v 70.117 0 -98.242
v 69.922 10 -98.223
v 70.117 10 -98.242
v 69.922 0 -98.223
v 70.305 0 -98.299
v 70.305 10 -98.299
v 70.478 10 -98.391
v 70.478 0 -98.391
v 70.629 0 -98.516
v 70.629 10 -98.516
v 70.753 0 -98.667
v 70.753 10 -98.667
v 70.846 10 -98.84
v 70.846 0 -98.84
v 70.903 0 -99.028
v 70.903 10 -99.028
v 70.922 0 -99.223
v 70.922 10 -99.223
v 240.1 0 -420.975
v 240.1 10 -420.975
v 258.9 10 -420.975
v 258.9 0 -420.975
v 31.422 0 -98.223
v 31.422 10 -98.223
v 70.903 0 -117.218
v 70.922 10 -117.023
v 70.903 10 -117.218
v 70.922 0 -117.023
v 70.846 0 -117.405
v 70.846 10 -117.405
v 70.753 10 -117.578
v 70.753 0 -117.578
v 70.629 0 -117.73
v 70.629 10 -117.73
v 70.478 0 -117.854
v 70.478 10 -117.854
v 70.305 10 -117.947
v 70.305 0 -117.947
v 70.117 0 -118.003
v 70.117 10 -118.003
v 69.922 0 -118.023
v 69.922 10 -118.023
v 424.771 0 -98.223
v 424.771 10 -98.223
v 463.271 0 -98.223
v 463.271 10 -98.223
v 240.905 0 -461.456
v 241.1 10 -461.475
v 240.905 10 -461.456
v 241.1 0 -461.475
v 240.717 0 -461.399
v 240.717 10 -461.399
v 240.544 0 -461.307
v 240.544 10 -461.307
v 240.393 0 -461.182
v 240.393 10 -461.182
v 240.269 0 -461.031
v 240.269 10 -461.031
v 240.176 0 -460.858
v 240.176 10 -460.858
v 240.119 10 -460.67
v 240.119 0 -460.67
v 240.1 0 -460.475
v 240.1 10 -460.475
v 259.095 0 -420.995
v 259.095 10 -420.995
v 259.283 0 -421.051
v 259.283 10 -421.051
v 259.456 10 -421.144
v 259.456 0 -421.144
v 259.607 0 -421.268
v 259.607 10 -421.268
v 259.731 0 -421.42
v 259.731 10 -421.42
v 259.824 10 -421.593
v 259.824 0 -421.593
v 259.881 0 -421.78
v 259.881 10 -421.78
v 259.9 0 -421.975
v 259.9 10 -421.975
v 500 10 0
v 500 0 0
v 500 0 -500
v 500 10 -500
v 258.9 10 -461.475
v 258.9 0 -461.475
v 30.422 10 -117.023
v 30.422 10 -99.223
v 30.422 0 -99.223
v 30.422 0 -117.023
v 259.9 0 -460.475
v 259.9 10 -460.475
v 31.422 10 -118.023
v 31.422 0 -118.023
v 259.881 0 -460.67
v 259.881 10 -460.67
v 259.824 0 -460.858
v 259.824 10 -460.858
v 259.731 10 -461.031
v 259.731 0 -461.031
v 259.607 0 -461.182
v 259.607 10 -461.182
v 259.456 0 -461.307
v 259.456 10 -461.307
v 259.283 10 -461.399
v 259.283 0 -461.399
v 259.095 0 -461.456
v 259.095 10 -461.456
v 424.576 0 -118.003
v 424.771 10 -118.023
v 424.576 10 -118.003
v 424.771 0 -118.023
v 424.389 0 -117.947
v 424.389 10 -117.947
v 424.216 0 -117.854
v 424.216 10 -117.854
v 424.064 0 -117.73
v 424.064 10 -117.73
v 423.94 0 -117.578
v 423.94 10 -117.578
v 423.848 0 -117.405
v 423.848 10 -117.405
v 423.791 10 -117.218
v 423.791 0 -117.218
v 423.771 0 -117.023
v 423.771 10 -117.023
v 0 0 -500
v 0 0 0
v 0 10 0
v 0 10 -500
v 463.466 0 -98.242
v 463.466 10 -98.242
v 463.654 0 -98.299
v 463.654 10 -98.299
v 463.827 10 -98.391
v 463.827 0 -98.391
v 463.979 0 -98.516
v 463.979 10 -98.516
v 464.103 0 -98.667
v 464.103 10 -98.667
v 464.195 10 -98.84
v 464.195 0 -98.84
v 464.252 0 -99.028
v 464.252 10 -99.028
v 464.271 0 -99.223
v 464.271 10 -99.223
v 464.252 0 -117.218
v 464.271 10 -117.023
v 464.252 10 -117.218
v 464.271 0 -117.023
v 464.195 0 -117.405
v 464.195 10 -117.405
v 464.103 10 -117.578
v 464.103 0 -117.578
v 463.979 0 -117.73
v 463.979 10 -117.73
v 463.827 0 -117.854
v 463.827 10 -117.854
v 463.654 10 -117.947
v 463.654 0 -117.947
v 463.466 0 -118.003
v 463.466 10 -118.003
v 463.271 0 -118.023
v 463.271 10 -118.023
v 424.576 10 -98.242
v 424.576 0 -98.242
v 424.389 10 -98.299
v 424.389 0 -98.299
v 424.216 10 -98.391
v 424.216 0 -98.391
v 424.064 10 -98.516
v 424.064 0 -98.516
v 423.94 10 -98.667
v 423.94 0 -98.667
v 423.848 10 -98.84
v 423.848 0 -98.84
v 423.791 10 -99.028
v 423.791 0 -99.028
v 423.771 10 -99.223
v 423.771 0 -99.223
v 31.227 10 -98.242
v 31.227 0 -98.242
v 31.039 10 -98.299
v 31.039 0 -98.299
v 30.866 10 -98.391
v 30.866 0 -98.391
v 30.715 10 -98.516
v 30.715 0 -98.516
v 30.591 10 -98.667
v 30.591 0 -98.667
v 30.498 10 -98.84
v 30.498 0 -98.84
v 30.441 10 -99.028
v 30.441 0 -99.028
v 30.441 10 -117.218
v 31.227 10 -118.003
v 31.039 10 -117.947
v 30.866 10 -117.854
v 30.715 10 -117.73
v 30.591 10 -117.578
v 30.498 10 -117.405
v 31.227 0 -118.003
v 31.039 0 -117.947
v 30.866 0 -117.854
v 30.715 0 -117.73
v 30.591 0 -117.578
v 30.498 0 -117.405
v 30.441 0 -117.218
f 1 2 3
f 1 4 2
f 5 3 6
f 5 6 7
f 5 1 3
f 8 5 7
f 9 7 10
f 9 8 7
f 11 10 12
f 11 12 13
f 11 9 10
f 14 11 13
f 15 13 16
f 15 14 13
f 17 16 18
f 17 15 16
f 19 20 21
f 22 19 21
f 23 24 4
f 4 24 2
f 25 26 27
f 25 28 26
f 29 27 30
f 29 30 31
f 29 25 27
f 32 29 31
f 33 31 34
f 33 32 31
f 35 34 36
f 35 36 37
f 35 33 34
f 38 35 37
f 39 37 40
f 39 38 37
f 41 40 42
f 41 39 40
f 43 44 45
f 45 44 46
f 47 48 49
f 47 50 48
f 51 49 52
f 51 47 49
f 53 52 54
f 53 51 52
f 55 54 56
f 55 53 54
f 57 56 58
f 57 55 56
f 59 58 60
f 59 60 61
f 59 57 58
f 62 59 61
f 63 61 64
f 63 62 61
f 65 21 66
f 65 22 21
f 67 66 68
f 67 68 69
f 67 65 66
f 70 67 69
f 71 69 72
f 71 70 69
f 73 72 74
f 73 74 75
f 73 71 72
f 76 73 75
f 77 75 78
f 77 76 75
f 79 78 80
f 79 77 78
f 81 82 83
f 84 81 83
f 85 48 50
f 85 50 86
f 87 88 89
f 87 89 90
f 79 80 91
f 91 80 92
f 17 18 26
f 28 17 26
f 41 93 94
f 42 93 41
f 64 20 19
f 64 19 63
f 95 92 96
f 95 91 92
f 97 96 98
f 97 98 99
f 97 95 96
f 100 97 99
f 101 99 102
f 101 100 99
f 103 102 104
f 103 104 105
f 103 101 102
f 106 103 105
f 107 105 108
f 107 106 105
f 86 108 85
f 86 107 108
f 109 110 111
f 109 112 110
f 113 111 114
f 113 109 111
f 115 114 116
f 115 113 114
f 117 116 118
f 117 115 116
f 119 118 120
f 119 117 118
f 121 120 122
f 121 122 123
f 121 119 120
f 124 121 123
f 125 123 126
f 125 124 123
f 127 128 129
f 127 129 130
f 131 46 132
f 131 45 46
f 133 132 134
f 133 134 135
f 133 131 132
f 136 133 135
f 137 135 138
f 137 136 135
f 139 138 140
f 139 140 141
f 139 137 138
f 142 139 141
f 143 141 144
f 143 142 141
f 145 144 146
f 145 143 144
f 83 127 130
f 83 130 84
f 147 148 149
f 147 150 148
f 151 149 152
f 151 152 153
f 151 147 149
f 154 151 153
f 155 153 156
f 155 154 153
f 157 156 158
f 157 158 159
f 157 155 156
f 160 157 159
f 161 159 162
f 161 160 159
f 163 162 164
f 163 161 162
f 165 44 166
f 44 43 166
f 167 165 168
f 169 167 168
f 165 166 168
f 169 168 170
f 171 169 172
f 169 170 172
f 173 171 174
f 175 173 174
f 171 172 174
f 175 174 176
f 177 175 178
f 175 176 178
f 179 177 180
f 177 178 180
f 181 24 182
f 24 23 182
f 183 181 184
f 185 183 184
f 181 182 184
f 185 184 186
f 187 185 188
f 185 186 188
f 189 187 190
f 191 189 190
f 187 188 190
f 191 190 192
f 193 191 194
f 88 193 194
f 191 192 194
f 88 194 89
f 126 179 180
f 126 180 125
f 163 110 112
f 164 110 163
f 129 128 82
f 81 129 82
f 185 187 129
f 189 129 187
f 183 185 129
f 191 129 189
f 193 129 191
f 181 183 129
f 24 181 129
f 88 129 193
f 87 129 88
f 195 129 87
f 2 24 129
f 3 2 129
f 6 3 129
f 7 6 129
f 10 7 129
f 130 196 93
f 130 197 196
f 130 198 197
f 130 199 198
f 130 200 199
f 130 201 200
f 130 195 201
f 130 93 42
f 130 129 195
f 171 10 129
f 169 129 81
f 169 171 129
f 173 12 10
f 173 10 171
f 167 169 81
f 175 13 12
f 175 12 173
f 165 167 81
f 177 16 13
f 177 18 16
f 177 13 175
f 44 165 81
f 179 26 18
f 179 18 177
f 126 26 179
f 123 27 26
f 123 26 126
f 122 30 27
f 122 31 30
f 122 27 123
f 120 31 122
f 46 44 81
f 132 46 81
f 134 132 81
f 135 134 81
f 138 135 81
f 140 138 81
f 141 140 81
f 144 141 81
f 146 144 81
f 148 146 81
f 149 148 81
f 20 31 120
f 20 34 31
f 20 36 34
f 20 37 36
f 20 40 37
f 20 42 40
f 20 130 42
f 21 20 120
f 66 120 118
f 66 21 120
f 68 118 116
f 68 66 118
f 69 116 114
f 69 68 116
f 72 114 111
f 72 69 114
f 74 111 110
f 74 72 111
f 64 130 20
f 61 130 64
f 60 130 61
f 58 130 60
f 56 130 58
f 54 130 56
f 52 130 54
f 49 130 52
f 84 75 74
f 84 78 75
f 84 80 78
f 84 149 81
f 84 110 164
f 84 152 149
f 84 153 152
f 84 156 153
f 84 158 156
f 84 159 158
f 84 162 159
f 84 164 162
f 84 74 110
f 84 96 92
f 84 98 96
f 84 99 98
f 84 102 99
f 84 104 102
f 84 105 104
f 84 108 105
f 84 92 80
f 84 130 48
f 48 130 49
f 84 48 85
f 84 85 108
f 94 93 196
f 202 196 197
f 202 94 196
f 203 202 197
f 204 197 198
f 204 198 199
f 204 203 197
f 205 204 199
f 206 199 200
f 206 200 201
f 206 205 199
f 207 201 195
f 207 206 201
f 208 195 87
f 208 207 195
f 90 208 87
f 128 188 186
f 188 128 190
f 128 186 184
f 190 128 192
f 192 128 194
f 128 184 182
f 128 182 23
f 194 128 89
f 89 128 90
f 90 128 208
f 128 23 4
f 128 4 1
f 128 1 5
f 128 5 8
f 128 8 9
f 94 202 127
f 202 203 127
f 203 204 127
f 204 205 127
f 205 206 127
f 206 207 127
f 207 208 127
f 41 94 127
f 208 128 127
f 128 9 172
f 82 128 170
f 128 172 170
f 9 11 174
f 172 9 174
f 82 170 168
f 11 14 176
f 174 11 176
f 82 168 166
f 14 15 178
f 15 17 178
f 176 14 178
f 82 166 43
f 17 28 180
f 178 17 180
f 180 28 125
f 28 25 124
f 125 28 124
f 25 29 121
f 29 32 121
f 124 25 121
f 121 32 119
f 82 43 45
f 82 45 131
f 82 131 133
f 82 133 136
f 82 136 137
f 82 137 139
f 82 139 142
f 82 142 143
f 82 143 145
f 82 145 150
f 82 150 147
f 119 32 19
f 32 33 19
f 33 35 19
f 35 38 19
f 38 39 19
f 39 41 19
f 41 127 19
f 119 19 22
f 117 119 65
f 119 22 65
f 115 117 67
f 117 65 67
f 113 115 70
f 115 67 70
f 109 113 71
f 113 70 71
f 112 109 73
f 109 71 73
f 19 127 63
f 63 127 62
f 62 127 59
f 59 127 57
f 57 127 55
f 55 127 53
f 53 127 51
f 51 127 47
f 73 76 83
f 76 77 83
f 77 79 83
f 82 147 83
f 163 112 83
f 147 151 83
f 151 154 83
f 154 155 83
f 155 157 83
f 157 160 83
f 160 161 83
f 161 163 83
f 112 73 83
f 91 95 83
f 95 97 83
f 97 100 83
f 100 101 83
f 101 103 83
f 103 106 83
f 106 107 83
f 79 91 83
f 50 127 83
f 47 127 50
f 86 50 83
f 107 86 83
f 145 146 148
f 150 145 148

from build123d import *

# Parameters (mm, degrees)
CROQUIS1_W              = 500
CROQUIS1_H              = 500
SALIENTE_EXTRUIR1_DEPTH = 10
CROQUIS22_W             = 40.5
CROQUIS22_H             = 19.8
CROQUIS22_W_2           = 19.8
CROQUIS22_H_2           = 40.5
CORTAR_EXTRUIR1_DEPTH   = 10
REDONDEO1_R             = 1


with BuildPart() as part:
    # Croquis1 → Saliente-Extruir1 (new body)
    with BuildSketch(Plane(origin=(0, 0, 0), x_dir=(1, 0, 0), z_dir=(0, 1, 0))):
        with Locations((250, 250)):
            Rectangle(CROQUIS1_W, CROQUIS1_H)
    extrude(amount=SALIENTE_EXTRUIR1_DEPTH)

    # Croquis22 → Cortar-Extruir1 (cut)
    with BuildSketch(Plane(origin=(0, 10, 0), x_dir=(1, 0, 0), z_dir=(0, 1, 0))):
        with Locations((50.671999964, 108.122675133)):
            Rectangle(CROQUIS22_W, CROQUIS22_H)
        with Locations((444.021393457, 108.122675133)):
            Rectangle(CROQUIS22_W, CROQUIS22_H)
        with Locations((250, 441.225372138)):
            Rectangle(CROQUIS22_W_2, CROQUIS22_H_2)
    extrude(amount=-CORTAR_EXTRUIR1_DEPTH, mode=Mode.SUBTRACT)

    # Redondeo1
    redondeo1_edges = [part.edges().sort_by_distance(p)[0] for p in [
        (30.421999964, 5, -98.222675133),
        (30.421999964, 5, -118.022675133),
        (70.921999964, 5, -118.022675133),
        (70.921999964, 5, -98.222675133),
        (423.771393457, 5, -98.222675133),
        (423.771393457, 5, -118.022675133),
        (464.271393457, 5, -118.022675133),
        (464.271393457, 5, -98.222675133),
        (240.1, 5, -461.475372138),
        (259.9, 5, -461.475372138),
        (259.9, 5, -420.975372138),
    ]]
    fillet(redondeo1_edges, radius=REDONDEO1_R)


solid = part.part
